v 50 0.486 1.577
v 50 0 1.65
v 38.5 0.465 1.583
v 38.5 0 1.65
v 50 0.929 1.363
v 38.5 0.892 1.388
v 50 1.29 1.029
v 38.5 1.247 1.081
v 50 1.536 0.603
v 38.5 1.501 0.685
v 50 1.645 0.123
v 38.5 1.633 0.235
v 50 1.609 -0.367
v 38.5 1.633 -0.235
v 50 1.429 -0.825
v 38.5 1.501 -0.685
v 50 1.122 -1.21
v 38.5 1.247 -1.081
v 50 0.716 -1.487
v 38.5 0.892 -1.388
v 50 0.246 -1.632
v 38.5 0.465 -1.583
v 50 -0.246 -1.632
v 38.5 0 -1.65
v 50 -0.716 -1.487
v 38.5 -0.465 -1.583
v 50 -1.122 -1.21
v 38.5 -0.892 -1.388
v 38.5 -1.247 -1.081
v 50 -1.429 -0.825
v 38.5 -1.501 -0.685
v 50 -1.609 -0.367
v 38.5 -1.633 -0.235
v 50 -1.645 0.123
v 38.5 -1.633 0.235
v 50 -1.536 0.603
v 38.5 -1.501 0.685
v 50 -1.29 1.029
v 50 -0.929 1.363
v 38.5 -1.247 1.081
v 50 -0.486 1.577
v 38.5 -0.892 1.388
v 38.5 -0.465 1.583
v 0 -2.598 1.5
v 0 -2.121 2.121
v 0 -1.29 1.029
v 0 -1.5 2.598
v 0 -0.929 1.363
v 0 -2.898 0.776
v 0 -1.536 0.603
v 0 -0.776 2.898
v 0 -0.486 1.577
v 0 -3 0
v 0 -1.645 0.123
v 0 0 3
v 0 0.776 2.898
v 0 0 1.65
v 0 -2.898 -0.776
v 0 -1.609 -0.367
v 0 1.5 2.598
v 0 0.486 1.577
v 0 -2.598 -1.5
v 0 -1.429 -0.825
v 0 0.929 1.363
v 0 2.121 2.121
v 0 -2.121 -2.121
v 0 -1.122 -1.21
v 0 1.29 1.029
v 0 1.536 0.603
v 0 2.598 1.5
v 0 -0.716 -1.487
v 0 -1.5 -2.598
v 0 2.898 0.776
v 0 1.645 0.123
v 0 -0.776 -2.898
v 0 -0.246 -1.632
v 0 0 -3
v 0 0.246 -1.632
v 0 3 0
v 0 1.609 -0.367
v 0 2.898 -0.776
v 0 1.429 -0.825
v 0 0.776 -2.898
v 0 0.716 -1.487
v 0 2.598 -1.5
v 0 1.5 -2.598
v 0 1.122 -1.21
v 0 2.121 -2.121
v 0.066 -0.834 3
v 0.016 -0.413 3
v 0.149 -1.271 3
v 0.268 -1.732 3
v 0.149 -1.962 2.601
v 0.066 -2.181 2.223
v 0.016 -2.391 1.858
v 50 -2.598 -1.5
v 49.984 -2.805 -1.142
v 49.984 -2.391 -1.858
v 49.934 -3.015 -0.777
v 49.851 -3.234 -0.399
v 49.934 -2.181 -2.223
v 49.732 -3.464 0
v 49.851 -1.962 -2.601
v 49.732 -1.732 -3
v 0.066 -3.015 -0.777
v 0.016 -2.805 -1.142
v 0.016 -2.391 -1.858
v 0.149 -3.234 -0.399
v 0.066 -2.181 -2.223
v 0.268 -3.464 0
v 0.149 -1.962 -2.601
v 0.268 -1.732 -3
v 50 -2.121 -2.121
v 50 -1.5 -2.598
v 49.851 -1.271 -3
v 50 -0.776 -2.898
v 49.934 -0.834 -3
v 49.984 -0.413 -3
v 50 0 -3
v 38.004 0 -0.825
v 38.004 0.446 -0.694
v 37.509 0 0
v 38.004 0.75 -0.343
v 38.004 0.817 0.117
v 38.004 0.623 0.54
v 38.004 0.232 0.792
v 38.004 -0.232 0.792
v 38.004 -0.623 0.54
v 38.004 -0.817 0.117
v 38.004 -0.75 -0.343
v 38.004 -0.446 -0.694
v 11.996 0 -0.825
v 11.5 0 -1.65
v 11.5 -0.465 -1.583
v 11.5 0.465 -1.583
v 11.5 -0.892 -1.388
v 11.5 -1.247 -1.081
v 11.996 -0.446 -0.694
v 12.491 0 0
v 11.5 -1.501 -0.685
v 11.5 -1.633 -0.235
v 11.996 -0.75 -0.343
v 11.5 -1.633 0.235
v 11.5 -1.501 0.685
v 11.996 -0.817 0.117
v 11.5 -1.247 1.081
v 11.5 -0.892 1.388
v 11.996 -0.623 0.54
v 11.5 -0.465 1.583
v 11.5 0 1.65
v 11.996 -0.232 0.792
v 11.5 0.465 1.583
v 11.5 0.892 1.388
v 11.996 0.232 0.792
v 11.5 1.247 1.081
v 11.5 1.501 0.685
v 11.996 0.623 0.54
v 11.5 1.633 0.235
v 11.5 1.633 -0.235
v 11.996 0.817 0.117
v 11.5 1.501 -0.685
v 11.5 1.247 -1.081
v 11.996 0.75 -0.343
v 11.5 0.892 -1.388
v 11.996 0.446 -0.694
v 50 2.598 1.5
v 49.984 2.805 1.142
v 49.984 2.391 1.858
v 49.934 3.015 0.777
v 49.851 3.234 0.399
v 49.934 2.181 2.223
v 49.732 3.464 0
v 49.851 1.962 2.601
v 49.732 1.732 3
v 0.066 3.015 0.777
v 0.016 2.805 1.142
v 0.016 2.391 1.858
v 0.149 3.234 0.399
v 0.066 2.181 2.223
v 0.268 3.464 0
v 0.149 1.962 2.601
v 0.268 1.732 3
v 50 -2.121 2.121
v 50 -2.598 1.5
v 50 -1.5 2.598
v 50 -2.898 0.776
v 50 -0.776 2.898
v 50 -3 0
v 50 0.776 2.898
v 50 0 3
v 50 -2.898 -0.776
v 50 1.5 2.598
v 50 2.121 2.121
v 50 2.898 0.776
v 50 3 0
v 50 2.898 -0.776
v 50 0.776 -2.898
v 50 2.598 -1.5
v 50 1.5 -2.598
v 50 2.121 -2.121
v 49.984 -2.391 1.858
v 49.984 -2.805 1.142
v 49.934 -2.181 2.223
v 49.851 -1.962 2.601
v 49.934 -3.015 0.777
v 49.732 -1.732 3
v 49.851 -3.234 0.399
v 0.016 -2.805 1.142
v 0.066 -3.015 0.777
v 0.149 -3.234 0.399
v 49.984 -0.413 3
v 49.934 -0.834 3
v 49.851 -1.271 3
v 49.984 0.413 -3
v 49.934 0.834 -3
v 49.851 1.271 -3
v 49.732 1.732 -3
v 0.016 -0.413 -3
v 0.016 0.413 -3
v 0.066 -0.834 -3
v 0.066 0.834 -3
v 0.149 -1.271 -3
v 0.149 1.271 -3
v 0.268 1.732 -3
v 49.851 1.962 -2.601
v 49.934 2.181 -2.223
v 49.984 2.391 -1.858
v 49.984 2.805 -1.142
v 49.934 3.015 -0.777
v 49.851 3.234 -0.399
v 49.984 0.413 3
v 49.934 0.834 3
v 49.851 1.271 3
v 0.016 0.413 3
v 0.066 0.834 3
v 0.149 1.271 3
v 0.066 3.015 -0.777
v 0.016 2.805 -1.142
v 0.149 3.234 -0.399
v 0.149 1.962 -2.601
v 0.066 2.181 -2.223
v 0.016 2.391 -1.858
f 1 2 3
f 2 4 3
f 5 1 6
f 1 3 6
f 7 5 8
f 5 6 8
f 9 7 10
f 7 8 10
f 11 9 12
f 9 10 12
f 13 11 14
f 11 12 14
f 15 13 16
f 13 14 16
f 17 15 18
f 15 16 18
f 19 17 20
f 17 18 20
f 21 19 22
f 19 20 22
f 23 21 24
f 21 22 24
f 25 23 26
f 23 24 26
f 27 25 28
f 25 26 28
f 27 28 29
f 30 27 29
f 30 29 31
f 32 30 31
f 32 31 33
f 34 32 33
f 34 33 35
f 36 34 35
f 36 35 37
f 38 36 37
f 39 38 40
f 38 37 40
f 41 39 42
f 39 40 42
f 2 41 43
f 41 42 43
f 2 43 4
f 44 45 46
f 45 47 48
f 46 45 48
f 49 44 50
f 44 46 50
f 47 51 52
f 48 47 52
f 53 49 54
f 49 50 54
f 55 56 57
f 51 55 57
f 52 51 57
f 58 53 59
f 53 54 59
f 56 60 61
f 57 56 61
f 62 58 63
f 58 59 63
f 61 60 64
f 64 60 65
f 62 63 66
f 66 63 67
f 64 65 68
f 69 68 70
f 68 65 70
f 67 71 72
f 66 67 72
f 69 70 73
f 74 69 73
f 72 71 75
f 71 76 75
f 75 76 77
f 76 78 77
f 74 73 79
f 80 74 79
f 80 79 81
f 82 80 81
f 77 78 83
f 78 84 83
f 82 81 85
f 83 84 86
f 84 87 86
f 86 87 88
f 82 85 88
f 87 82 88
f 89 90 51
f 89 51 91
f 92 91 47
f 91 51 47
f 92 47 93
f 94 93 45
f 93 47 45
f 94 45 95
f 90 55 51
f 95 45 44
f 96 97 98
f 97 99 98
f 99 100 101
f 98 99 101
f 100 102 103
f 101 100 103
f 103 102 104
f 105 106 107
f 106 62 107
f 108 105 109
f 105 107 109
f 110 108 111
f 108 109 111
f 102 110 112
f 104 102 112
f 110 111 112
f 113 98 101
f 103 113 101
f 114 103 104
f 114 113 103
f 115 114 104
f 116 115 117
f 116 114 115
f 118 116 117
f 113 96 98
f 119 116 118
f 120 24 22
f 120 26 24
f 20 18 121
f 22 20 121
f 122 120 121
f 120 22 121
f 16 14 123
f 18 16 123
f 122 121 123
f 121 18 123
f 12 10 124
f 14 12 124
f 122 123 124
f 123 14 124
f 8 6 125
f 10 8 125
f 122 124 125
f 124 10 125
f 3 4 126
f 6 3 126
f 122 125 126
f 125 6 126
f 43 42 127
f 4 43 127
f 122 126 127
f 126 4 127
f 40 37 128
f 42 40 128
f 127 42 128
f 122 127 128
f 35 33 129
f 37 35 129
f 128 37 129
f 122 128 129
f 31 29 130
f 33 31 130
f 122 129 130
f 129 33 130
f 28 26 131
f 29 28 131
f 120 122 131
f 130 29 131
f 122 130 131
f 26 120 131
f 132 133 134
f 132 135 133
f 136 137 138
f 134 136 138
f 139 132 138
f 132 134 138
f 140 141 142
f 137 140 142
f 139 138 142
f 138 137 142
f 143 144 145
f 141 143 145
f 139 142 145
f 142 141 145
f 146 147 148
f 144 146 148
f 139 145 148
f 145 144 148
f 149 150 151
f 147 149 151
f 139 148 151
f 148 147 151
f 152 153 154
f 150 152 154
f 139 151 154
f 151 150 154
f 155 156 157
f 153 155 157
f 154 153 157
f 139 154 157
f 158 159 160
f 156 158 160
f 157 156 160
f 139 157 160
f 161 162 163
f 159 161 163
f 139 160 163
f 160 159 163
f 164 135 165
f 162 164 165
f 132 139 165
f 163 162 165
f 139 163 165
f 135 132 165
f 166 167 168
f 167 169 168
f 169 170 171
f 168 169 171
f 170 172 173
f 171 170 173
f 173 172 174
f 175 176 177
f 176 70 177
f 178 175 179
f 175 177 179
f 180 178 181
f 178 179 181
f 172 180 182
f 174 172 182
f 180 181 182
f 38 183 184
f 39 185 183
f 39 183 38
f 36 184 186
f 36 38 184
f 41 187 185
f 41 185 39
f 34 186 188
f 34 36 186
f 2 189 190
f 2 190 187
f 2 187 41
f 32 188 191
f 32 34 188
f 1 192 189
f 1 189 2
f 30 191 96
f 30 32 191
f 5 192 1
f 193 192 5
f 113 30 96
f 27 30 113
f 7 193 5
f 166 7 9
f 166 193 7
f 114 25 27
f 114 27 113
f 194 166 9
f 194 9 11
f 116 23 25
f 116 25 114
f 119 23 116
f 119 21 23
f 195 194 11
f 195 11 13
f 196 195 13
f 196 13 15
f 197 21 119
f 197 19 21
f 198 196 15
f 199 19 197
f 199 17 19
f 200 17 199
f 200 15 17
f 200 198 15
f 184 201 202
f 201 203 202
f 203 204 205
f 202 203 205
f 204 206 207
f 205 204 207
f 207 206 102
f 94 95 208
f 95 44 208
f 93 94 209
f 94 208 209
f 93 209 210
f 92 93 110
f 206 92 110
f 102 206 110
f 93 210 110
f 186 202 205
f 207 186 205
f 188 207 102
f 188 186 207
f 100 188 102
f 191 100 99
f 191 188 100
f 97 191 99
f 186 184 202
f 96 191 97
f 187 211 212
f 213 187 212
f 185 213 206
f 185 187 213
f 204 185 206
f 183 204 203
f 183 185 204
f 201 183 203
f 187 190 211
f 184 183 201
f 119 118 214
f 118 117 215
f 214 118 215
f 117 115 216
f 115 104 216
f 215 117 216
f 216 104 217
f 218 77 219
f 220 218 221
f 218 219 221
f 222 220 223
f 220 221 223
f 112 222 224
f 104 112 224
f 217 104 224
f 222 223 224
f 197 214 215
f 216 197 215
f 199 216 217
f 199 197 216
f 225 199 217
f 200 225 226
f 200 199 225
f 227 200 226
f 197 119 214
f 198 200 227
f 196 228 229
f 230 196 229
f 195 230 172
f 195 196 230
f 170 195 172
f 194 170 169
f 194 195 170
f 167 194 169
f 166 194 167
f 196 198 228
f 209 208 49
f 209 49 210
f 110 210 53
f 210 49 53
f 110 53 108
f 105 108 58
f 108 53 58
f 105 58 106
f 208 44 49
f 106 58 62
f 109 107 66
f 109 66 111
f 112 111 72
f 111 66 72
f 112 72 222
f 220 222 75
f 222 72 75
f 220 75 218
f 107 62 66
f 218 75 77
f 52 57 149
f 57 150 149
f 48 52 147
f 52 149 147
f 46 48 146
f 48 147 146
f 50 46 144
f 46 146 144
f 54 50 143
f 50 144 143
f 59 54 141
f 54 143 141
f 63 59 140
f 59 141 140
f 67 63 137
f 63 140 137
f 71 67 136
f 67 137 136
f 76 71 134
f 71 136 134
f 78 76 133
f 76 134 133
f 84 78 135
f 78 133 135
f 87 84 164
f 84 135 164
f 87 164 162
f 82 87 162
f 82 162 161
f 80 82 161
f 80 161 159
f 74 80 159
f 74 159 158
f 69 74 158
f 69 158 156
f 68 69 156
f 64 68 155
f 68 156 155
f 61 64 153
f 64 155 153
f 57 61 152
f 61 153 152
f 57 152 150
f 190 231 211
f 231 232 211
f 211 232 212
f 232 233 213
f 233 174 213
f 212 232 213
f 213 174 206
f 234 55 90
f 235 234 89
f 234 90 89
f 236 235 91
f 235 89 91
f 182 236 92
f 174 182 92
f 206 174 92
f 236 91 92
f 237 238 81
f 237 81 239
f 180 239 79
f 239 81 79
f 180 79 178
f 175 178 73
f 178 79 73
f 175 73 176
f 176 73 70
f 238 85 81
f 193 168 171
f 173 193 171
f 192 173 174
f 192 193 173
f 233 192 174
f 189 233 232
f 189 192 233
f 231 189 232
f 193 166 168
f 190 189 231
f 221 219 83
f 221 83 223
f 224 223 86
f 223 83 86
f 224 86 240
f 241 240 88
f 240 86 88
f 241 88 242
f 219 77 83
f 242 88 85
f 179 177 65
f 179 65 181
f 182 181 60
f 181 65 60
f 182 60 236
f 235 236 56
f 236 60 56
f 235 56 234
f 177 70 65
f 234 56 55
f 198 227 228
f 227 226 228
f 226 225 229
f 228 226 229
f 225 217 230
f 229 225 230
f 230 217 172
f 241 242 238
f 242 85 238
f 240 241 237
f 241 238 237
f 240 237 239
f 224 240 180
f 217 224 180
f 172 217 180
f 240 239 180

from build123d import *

# Parameters (mm, degrees)
BOSS_EXTRUDE1_DEPTH = 50
SKETCH21_W          = 50
SKETCH21_H          = 3
TAPPED_HOLE4_D      = 3.3
TAPPED_HOLE4_DEPTH  = 11.5
TAPPED_HOLE4_TIP    = 0.991420021
TAPPED_HOLE5_D      = 3.3
TAPPED_HOLE5_DEPTH  = 11.5
TAPPED_HOLE5_TIP    = 0.991420021


with BuildPart() as part:
    # Sketch1 → Boss-Extrude1 (new body)
    with BuildSketch(Plane(origin=(0, 0, 0), x_dir=(0, 0, -1), z_dir=(1, 0, 0))):
        Polygon((0, -3.464101615), (3, -1.732050808), (3, 1.732050808), (0, 3.464101615), (-3, 1.732050808), (-3, -1.732050808), align=None)
    extrude(amount=BOSS_EXTRUDE1_DEPTH)

    # Sketch2 → Cut-Revolve1 (revolve, cut)
    with BuildSketch(Plane.XY):
        Polygon((0, 3.464101615), (0.267949192, 3.464101615), (0, 3), align=None)
        Polygon((49.732050808, 3.464101615), (50, 3), (50, 3.464101615), align=None)
    revolve(axis=Axis((0, 0, 0), (1, 0, 0)), mode=Mode.SUBTRACT)

    # Sketch21 → Revolve1 (revolve)
    with BuildSketch(Plane.XY):
        with Locations((25, 1.5)):
            Rectangle(SKETCH21_W, SKETCH21_H)
    revolve(axis=Axis((0, 0, 0), (1, 0, 0)))

    # Tapped Hole4
    with Locations(Plane(origin=(0, -0.118657881, 0.00506752), x_dir=(0, 0, -1), z_dir=(-1, 0, 0))):
        with Locations((0.00506752, -0.118657881)):
            Hole(TAPPED_HOLE4_D / 2, depth=TAPPED_HOLE4_DEPTH)
            with Locations((0, 0, -(TAPPED_HOLE4_DEPTH + TAPPED_HOLE4_TIP / 2))):  # 118° drill point
                Cone(0, TAPPED_HOLE4_D / 2, TAPPED_HOLE4_TIP, mode=Mode.SUBTRACT)

    # Tapped Hole5
    with Locations(Plane(origin=(50, 0.843813549, 0.0751412), x_dir=(0, 0, -1), z_dir=(1, 0, 0))):
        with Locations((0.0751412, -0.843813549)):
            Hole(TAPPED_HOLE5_D / 2, depth=TAPPED_HOLE5_DEPTH)
            with Locations((0, 0, -(TAPPED_HOLE5_DEPTH + TAPPED_HOLE5_TIP / 2))):  # 118° drill point
                Cone(0, TAPPED_HOLE5_D / 2, TAPPED_HOLE5_TIP, mode=Mode.SUBTRACT)


solid = part.part
